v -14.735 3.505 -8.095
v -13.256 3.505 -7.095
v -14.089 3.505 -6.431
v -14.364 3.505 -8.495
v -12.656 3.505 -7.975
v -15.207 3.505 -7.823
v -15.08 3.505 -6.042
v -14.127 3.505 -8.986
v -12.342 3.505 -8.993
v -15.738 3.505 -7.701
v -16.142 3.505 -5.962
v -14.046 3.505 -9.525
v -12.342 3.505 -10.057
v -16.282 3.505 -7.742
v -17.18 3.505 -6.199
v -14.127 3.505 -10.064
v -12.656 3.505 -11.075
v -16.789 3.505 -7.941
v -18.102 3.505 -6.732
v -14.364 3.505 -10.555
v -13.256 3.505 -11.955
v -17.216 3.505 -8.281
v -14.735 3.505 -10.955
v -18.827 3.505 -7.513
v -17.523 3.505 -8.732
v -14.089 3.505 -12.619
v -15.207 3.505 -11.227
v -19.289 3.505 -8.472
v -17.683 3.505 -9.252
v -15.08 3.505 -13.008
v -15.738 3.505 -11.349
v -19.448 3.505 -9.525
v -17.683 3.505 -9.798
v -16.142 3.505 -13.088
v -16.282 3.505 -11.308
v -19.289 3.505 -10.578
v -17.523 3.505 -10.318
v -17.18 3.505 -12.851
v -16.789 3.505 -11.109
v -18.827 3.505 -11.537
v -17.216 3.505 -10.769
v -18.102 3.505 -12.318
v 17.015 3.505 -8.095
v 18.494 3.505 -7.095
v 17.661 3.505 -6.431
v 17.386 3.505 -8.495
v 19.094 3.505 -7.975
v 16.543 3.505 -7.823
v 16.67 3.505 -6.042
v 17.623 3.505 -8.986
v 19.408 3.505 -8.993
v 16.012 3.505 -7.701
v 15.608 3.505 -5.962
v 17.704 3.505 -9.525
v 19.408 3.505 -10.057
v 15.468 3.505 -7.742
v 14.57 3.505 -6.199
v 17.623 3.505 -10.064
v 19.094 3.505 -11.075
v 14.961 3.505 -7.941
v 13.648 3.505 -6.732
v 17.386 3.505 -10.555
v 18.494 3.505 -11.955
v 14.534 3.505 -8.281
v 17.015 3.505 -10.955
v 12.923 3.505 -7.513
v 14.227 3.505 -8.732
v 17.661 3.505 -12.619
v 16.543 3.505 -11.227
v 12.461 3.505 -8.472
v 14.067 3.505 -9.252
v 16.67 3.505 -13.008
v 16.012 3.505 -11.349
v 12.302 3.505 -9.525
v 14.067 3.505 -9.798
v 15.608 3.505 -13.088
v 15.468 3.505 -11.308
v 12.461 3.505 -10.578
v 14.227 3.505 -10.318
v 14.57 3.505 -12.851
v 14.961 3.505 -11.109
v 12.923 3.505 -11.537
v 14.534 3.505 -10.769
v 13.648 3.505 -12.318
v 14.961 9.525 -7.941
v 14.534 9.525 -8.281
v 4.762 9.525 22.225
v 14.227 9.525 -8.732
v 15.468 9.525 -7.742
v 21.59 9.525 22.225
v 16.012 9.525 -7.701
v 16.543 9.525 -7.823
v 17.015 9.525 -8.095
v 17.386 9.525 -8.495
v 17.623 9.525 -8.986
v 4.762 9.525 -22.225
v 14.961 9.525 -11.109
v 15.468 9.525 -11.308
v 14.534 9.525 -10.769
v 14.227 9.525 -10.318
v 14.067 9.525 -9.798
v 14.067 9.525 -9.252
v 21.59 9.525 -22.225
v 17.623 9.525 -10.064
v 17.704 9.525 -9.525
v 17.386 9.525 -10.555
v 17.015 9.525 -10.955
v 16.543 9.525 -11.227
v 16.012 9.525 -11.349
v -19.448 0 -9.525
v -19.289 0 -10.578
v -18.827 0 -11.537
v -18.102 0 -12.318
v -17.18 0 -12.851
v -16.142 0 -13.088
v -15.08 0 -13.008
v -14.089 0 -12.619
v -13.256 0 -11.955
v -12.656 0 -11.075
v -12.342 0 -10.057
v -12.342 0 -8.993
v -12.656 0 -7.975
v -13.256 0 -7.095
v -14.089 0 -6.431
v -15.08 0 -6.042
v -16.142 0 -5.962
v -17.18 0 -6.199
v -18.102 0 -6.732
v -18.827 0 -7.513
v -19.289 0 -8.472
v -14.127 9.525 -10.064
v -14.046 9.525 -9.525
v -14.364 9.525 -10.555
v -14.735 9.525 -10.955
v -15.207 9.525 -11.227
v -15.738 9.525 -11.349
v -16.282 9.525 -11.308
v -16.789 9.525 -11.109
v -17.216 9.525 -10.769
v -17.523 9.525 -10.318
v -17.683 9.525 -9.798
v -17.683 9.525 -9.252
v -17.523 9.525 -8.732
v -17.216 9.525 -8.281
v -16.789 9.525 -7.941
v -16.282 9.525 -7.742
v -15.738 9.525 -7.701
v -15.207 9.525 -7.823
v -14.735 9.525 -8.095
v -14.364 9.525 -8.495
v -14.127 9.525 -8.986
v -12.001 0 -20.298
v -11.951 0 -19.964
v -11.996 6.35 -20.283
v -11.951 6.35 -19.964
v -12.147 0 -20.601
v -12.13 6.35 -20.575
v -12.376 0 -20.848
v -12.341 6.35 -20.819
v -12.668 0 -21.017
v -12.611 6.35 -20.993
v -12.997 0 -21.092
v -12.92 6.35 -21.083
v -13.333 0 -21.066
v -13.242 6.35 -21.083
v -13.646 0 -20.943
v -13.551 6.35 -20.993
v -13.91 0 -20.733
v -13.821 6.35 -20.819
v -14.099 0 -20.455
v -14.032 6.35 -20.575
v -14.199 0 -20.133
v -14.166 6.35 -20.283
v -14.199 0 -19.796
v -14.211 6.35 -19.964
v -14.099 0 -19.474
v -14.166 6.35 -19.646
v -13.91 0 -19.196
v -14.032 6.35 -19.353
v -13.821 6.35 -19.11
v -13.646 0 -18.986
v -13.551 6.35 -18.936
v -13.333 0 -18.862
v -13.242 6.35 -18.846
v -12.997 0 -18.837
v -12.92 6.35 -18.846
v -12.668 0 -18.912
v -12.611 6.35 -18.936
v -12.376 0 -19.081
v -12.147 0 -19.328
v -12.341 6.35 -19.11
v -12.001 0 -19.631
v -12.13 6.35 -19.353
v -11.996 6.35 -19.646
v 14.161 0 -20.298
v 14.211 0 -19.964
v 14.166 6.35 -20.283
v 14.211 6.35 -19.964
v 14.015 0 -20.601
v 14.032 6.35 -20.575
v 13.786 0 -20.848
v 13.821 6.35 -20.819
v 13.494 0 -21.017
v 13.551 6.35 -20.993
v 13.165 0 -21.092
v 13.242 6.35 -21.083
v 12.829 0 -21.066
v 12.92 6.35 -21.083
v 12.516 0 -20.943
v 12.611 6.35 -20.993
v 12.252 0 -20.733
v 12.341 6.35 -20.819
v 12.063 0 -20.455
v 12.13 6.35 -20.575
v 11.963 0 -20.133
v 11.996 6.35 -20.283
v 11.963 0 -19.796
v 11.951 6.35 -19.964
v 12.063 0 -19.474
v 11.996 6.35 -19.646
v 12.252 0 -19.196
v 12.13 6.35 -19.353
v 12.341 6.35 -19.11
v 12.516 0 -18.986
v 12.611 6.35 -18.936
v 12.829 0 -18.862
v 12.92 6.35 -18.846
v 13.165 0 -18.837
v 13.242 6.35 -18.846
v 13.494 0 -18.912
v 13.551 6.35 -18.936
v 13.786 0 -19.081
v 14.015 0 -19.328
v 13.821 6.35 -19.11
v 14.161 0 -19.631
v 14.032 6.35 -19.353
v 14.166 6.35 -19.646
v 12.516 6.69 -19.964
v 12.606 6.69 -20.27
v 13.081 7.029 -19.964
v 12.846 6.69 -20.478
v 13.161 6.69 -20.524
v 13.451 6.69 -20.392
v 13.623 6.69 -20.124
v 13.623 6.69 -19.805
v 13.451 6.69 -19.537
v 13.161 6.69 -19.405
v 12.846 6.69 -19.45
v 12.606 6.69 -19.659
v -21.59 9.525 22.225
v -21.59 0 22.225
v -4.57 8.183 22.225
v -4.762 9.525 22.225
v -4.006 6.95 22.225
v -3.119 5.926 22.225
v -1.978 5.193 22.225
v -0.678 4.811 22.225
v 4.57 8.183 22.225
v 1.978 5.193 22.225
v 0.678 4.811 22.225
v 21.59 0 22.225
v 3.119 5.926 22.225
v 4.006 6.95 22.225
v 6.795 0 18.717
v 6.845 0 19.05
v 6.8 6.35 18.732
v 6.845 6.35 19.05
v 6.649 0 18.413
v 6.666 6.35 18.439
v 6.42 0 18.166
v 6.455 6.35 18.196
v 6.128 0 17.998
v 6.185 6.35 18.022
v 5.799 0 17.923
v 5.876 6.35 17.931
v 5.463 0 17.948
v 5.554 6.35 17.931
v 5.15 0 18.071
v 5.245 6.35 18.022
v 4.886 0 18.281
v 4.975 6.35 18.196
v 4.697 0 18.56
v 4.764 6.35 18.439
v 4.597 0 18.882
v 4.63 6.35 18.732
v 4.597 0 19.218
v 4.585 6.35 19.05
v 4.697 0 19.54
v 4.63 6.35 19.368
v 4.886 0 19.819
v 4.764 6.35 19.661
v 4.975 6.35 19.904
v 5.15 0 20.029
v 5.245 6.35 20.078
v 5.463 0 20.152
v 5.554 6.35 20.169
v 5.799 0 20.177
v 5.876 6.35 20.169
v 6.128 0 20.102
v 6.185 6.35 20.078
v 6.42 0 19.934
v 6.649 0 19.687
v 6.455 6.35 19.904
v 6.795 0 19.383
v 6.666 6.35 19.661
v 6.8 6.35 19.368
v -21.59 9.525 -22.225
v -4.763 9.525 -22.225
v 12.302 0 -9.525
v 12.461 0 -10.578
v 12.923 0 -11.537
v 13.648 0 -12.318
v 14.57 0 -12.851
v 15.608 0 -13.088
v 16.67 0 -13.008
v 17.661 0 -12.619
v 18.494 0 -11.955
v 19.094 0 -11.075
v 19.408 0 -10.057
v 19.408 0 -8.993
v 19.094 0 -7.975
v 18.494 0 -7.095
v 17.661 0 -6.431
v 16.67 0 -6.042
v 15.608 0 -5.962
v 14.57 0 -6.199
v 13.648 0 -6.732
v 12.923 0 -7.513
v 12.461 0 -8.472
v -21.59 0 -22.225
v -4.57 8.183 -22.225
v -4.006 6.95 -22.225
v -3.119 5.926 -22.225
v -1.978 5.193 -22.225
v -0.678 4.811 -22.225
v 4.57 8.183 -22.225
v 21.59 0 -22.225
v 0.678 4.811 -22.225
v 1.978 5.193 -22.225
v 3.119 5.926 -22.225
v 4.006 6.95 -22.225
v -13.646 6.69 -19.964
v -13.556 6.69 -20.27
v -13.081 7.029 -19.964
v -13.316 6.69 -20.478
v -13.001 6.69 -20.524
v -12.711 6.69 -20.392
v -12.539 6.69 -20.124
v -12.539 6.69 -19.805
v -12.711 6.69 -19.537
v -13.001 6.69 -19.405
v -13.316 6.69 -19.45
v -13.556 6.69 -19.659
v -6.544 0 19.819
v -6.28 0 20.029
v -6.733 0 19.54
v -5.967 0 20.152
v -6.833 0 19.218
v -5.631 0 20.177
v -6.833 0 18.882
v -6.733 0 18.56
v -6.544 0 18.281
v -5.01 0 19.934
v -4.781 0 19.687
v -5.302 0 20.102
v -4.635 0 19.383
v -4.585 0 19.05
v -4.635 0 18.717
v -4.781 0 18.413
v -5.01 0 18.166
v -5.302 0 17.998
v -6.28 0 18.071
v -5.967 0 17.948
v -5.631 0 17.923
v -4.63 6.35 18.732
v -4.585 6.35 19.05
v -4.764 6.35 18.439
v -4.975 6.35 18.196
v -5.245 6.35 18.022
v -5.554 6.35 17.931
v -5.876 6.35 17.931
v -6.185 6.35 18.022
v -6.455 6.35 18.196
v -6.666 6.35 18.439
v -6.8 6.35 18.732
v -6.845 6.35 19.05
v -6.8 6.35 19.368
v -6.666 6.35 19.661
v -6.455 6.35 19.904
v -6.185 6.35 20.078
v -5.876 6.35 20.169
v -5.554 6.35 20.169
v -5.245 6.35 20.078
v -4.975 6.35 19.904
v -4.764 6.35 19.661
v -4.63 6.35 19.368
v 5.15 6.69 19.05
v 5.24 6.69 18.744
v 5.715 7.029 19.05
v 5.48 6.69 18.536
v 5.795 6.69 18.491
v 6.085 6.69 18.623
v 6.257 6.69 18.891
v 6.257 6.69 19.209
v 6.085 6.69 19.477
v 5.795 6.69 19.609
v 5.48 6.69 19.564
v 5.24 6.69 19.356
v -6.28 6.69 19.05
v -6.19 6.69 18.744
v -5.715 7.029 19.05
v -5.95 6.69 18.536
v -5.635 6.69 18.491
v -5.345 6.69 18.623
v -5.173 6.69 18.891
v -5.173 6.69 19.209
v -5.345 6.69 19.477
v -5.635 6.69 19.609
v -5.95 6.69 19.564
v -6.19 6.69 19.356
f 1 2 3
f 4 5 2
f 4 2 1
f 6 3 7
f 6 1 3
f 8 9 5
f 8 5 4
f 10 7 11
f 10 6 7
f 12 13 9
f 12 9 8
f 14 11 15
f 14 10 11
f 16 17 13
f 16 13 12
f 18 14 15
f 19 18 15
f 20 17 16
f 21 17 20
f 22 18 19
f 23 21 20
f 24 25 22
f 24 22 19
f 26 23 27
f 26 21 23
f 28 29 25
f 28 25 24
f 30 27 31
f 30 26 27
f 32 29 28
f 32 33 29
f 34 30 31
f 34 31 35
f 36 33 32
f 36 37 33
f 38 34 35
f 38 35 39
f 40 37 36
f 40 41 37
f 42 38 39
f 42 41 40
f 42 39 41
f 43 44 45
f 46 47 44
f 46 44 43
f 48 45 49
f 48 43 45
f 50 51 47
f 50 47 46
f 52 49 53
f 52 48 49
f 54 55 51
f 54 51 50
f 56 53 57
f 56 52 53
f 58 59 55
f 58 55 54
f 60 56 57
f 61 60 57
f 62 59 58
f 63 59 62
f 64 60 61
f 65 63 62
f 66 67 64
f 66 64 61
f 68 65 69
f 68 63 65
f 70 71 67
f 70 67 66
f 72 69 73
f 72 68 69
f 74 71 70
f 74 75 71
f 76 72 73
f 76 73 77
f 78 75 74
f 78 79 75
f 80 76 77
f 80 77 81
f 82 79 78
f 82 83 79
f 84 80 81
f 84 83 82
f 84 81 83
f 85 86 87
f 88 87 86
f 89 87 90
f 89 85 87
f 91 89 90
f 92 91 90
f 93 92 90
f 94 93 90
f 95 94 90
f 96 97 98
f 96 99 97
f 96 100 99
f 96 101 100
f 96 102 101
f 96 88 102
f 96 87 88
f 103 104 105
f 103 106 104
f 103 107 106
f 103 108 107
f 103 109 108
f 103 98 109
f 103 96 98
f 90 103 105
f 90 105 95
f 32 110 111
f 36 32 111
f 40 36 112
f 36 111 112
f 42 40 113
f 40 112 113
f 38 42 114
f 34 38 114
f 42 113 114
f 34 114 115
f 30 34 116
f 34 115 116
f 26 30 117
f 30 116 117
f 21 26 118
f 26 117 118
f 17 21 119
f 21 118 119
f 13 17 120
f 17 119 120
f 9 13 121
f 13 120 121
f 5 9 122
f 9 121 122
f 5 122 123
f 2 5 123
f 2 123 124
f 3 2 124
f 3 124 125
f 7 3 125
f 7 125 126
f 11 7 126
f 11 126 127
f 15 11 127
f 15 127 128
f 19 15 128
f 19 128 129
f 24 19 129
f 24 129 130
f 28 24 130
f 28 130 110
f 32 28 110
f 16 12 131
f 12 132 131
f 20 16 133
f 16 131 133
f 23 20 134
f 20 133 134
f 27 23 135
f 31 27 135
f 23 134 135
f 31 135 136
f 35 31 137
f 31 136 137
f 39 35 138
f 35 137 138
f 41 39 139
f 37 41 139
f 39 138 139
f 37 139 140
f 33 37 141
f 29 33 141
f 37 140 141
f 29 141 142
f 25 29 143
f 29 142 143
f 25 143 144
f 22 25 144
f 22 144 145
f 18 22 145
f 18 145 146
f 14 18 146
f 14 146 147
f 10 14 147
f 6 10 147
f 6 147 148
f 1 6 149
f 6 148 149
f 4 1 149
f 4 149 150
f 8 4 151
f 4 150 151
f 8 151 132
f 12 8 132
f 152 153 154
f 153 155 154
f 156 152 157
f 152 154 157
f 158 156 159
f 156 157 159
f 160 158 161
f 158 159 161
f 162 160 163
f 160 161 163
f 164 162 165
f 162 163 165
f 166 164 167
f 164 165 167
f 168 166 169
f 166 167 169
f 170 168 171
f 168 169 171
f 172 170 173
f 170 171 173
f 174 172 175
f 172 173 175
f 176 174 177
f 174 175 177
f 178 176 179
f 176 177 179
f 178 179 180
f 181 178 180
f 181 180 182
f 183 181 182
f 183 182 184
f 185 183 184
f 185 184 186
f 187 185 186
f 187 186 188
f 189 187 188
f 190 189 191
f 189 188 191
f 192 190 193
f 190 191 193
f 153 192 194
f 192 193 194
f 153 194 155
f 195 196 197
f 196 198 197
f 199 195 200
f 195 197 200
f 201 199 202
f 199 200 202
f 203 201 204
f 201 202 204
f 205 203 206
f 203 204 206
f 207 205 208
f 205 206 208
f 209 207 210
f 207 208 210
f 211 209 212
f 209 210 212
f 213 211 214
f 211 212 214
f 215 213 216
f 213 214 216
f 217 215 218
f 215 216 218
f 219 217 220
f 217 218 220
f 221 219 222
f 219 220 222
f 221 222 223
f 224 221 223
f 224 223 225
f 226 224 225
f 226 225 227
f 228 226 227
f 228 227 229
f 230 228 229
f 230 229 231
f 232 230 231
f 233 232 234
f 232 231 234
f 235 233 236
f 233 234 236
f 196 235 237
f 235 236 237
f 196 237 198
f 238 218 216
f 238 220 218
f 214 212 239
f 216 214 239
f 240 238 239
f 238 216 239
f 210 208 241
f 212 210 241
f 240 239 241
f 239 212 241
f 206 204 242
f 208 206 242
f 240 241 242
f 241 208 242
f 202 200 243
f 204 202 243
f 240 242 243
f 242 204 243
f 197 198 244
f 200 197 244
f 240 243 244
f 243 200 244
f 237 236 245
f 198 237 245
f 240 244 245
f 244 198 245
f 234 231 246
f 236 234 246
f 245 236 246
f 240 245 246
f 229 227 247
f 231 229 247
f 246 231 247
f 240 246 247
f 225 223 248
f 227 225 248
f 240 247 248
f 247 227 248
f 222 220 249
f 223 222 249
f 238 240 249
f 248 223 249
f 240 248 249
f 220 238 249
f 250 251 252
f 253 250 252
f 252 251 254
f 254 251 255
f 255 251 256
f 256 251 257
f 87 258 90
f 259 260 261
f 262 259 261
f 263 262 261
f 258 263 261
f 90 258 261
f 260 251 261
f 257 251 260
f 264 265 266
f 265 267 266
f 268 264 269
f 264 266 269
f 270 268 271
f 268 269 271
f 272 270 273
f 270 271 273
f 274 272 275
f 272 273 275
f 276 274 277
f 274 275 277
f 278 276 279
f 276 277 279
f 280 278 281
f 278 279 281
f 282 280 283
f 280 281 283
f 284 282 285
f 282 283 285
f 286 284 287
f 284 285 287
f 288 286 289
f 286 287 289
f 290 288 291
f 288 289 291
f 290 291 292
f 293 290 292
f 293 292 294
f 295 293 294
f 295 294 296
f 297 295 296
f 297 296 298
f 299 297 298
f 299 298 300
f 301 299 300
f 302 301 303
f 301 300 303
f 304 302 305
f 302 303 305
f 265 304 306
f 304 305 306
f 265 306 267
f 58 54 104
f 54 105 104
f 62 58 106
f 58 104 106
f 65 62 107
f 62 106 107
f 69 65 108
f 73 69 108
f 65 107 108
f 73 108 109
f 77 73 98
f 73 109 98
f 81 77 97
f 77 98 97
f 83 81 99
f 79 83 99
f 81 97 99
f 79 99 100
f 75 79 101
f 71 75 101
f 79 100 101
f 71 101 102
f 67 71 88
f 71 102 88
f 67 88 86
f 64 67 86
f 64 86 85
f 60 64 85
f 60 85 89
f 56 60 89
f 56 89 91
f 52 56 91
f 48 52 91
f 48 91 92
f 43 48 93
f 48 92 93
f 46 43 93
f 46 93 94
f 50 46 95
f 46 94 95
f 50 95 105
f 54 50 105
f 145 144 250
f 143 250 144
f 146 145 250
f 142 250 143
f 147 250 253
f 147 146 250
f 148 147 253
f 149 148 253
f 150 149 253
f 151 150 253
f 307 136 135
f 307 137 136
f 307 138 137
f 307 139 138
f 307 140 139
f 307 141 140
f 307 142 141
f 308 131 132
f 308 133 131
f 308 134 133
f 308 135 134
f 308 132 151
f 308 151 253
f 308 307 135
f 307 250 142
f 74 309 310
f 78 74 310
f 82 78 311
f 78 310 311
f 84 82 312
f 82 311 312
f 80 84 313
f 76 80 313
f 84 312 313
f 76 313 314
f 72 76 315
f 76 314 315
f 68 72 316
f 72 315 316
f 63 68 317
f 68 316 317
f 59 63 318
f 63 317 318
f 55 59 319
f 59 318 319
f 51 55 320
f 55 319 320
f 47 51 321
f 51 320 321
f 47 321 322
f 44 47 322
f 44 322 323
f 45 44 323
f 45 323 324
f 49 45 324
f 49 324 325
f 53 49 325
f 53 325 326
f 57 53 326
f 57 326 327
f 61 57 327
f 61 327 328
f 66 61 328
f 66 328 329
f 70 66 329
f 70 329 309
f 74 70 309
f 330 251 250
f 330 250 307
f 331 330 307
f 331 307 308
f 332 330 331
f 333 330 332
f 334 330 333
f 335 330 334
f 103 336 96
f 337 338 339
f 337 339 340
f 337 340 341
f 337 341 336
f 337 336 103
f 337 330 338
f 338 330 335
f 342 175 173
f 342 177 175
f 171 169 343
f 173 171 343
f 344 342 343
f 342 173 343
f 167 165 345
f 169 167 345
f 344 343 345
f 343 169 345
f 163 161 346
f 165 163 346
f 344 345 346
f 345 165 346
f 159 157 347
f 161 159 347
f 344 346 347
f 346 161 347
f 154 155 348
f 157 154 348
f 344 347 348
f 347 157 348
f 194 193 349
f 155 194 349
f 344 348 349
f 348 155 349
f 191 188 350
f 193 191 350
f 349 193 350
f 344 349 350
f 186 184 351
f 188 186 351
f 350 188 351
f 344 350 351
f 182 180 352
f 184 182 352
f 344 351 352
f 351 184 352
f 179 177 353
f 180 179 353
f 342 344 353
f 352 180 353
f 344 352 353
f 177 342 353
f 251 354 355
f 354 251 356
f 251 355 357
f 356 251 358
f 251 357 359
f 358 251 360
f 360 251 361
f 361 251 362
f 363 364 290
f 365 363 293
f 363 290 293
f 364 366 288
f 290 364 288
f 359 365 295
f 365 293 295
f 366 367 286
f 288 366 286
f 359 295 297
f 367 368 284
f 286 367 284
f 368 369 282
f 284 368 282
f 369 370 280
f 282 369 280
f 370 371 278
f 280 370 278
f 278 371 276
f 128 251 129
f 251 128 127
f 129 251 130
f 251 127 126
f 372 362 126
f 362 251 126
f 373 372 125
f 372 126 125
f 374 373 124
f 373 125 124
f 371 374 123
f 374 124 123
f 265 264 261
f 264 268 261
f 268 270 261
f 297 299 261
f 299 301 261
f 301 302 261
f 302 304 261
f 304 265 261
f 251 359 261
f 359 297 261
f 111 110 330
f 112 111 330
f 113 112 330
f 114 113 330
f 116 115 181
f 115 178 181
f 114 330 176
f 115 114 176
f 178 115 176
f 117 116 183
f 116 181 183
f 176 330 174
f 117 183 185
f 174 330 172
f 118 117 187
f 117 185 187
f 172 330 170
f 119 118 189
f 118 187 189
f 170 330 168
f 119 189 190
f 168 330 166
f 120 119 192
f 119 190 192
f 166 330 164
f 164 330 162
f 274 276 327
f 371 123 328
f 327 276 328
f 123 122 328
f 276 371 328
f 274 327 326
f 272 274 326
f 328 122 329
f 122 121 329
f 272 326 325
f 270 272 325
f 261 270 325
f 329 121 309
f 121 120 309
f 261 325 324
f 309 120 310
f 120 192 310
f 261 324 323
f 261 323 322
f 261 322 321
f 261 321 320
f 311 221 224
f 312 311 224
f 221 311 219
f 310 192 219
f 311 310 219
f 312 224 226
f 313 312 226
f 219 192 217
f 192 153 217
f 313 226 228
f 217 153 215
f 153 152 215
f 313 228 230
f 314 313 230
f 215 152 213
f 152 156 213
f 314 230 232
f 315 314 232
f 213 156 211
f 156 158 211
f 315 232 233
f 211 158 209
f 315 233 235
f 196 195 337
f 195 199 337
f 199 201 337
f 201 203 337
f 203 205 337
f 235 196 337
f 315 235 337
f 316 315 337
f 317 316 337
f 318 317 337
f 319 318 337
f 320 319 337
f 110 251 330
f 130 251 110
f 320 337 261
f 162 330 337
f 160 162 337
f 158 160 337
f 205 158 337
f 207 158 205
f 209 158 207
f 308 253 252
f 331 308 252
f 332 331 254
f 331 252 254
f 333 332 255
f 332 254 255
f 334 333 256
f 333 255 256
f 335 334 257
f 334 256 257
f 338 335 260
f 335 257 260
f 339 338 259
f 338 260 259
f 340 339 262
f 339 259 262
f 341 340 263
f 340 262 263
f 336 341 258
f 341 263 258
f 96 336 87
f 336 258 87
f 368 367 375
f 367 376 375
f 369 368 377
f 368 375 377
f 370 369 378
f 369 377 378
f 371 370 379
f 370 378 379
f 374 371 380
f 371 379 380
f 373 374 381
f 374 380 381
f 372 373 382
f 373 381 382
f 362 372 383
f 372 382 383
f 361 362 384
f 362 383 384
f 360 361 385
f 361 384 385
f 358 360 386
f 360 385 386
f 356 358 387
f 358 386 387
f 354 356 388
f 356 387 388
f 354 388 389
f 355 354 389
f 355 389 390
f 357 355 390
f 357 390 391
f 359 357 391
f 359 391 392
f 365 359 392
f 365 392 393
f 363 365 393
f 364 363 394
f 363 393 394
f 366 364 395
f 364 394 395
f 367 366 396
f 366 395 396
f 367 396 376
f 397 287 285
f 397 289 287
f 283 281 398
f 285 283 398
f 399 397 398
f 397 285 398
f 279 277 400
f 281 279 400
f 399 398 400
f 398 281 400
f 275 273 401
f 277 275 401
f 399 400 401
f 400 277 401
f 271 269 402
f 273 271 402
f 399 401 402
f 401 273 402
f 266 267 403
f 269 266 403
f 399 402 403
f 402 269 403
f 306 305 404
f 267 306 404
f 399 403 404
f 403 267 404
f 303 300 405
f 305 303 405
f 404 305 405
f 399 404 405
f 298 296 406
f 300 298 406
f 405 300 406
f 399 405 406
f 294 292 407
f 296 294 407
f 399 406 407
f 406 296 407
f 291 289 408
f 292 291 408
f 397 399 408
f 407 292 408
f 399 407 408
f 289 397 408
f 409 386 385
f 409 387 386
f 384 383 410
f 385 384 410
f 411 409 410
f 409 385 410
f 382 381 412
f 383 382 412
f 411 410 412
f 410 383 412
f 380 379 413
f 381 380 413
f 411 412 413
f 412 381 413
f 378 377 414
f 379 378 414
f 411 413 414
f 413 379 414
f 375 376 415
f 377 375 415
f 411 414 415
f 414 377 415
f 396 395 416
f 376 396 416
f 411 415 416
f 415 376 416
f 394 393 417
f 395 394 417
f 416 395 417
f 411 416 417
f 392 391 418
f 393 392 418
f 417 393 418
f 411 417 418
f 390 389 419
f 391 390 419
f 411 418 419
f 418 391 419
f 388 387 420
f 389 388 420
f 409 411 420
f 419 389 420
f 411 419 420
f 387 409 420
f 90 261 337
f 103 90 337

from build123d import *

# Parameters (mm, degrees)
SKETCH1_W                                      = 43.18
SKETCH1_H                                      = 44.45
BOSS_EXTRUDE1_DEPTH                            = 9.525
SKETCH4_R                                      = 4.7625
CUT_EXTRUDE1_DEPTH                             = 51.32550273
MOTORHOLES_D                                   = 2.2606
MOTORHOLES_DEPTH                               = 6.35
MOTORHOLES_TIP                                 = 0.679152758
CBORE_FOR_6_SOCKET_HEAD_CAP_SCREW1_D           = 3.6576
CBORE_FOR_6_SOCKET_HEAD_CAP_SCREW1_CBORE_D     = 7.14502
CBORE_FOR_6_SOCKET_HEAD_CAP_SCREW1_CBORE_DEPTH = 3.5052


with BuildPart() as part:
    # Sketch1 → Boss-Extrude1 (new body)
    with BuildSketch(Plane(origin=(0, 0, 0), x_dir=(1, 0, 0), z_dir=(0, 1, 0))):
        Rectangle(SKETCH1_W, SKETCH1_H)
    extrude(amount=BOSS_EXTRUDE1_DEPTH)

    # Sketch4 → Cut-Extrude1 (cut, through all)
    with BuildSketch(Plane.XY.offset(22.225)):
        with Locations((0, 9.525)):
            Circle(SKETCH4_R)
    extrude(amount=-CUT_EXTRUDE1_DEPTH, mode=Mode.SUBTRACT)

    # MotorHoles
    with Locations(Plane(origin=(0, 0, 0), x_dir=(-1, 0, 0), z_dir=(0, -1, 0))):
        with Locations((-5.715, -19.05), (5.715, -19.05), (13.081, 19.9644), (-13.081, 19.9644)):
            Hole(MOTORHOLES_D / 2, depth=MOTORHOLES_DEPTH)
            with Locations((0, 0, -(MOTORHOLES_DEPTH + MOTORHOLES_TIP / 2))):  # 118° drill point
                Cone(0, MOTORHOLES_D / 2, MOTORHOLES_TIP, mode=Mode.SUBTRACT)

    # CBORE for #6 Socket Head Cap Screw1 (through all)
    with Locations(Plane(origin=(0, 0, 0), x_dir=(-1, 0, 0), z_dir=(0, -1, 0))):
        with Locations((-15.875, 9.525), (15.875, 9.525)):
            CounterBoreHole(CBORE_FOR_6_SOCKET_HEAD_CAP_SCREW1_D / 2, CBORE_FOR_6_SOCKET_HEAD_CAP_SCREW1_CBORE_D / 2, CBORE_FOR_6_SOCKET_HEAD_CAP_SCREW1_CBORE_DEPTH)


solid = part.part
